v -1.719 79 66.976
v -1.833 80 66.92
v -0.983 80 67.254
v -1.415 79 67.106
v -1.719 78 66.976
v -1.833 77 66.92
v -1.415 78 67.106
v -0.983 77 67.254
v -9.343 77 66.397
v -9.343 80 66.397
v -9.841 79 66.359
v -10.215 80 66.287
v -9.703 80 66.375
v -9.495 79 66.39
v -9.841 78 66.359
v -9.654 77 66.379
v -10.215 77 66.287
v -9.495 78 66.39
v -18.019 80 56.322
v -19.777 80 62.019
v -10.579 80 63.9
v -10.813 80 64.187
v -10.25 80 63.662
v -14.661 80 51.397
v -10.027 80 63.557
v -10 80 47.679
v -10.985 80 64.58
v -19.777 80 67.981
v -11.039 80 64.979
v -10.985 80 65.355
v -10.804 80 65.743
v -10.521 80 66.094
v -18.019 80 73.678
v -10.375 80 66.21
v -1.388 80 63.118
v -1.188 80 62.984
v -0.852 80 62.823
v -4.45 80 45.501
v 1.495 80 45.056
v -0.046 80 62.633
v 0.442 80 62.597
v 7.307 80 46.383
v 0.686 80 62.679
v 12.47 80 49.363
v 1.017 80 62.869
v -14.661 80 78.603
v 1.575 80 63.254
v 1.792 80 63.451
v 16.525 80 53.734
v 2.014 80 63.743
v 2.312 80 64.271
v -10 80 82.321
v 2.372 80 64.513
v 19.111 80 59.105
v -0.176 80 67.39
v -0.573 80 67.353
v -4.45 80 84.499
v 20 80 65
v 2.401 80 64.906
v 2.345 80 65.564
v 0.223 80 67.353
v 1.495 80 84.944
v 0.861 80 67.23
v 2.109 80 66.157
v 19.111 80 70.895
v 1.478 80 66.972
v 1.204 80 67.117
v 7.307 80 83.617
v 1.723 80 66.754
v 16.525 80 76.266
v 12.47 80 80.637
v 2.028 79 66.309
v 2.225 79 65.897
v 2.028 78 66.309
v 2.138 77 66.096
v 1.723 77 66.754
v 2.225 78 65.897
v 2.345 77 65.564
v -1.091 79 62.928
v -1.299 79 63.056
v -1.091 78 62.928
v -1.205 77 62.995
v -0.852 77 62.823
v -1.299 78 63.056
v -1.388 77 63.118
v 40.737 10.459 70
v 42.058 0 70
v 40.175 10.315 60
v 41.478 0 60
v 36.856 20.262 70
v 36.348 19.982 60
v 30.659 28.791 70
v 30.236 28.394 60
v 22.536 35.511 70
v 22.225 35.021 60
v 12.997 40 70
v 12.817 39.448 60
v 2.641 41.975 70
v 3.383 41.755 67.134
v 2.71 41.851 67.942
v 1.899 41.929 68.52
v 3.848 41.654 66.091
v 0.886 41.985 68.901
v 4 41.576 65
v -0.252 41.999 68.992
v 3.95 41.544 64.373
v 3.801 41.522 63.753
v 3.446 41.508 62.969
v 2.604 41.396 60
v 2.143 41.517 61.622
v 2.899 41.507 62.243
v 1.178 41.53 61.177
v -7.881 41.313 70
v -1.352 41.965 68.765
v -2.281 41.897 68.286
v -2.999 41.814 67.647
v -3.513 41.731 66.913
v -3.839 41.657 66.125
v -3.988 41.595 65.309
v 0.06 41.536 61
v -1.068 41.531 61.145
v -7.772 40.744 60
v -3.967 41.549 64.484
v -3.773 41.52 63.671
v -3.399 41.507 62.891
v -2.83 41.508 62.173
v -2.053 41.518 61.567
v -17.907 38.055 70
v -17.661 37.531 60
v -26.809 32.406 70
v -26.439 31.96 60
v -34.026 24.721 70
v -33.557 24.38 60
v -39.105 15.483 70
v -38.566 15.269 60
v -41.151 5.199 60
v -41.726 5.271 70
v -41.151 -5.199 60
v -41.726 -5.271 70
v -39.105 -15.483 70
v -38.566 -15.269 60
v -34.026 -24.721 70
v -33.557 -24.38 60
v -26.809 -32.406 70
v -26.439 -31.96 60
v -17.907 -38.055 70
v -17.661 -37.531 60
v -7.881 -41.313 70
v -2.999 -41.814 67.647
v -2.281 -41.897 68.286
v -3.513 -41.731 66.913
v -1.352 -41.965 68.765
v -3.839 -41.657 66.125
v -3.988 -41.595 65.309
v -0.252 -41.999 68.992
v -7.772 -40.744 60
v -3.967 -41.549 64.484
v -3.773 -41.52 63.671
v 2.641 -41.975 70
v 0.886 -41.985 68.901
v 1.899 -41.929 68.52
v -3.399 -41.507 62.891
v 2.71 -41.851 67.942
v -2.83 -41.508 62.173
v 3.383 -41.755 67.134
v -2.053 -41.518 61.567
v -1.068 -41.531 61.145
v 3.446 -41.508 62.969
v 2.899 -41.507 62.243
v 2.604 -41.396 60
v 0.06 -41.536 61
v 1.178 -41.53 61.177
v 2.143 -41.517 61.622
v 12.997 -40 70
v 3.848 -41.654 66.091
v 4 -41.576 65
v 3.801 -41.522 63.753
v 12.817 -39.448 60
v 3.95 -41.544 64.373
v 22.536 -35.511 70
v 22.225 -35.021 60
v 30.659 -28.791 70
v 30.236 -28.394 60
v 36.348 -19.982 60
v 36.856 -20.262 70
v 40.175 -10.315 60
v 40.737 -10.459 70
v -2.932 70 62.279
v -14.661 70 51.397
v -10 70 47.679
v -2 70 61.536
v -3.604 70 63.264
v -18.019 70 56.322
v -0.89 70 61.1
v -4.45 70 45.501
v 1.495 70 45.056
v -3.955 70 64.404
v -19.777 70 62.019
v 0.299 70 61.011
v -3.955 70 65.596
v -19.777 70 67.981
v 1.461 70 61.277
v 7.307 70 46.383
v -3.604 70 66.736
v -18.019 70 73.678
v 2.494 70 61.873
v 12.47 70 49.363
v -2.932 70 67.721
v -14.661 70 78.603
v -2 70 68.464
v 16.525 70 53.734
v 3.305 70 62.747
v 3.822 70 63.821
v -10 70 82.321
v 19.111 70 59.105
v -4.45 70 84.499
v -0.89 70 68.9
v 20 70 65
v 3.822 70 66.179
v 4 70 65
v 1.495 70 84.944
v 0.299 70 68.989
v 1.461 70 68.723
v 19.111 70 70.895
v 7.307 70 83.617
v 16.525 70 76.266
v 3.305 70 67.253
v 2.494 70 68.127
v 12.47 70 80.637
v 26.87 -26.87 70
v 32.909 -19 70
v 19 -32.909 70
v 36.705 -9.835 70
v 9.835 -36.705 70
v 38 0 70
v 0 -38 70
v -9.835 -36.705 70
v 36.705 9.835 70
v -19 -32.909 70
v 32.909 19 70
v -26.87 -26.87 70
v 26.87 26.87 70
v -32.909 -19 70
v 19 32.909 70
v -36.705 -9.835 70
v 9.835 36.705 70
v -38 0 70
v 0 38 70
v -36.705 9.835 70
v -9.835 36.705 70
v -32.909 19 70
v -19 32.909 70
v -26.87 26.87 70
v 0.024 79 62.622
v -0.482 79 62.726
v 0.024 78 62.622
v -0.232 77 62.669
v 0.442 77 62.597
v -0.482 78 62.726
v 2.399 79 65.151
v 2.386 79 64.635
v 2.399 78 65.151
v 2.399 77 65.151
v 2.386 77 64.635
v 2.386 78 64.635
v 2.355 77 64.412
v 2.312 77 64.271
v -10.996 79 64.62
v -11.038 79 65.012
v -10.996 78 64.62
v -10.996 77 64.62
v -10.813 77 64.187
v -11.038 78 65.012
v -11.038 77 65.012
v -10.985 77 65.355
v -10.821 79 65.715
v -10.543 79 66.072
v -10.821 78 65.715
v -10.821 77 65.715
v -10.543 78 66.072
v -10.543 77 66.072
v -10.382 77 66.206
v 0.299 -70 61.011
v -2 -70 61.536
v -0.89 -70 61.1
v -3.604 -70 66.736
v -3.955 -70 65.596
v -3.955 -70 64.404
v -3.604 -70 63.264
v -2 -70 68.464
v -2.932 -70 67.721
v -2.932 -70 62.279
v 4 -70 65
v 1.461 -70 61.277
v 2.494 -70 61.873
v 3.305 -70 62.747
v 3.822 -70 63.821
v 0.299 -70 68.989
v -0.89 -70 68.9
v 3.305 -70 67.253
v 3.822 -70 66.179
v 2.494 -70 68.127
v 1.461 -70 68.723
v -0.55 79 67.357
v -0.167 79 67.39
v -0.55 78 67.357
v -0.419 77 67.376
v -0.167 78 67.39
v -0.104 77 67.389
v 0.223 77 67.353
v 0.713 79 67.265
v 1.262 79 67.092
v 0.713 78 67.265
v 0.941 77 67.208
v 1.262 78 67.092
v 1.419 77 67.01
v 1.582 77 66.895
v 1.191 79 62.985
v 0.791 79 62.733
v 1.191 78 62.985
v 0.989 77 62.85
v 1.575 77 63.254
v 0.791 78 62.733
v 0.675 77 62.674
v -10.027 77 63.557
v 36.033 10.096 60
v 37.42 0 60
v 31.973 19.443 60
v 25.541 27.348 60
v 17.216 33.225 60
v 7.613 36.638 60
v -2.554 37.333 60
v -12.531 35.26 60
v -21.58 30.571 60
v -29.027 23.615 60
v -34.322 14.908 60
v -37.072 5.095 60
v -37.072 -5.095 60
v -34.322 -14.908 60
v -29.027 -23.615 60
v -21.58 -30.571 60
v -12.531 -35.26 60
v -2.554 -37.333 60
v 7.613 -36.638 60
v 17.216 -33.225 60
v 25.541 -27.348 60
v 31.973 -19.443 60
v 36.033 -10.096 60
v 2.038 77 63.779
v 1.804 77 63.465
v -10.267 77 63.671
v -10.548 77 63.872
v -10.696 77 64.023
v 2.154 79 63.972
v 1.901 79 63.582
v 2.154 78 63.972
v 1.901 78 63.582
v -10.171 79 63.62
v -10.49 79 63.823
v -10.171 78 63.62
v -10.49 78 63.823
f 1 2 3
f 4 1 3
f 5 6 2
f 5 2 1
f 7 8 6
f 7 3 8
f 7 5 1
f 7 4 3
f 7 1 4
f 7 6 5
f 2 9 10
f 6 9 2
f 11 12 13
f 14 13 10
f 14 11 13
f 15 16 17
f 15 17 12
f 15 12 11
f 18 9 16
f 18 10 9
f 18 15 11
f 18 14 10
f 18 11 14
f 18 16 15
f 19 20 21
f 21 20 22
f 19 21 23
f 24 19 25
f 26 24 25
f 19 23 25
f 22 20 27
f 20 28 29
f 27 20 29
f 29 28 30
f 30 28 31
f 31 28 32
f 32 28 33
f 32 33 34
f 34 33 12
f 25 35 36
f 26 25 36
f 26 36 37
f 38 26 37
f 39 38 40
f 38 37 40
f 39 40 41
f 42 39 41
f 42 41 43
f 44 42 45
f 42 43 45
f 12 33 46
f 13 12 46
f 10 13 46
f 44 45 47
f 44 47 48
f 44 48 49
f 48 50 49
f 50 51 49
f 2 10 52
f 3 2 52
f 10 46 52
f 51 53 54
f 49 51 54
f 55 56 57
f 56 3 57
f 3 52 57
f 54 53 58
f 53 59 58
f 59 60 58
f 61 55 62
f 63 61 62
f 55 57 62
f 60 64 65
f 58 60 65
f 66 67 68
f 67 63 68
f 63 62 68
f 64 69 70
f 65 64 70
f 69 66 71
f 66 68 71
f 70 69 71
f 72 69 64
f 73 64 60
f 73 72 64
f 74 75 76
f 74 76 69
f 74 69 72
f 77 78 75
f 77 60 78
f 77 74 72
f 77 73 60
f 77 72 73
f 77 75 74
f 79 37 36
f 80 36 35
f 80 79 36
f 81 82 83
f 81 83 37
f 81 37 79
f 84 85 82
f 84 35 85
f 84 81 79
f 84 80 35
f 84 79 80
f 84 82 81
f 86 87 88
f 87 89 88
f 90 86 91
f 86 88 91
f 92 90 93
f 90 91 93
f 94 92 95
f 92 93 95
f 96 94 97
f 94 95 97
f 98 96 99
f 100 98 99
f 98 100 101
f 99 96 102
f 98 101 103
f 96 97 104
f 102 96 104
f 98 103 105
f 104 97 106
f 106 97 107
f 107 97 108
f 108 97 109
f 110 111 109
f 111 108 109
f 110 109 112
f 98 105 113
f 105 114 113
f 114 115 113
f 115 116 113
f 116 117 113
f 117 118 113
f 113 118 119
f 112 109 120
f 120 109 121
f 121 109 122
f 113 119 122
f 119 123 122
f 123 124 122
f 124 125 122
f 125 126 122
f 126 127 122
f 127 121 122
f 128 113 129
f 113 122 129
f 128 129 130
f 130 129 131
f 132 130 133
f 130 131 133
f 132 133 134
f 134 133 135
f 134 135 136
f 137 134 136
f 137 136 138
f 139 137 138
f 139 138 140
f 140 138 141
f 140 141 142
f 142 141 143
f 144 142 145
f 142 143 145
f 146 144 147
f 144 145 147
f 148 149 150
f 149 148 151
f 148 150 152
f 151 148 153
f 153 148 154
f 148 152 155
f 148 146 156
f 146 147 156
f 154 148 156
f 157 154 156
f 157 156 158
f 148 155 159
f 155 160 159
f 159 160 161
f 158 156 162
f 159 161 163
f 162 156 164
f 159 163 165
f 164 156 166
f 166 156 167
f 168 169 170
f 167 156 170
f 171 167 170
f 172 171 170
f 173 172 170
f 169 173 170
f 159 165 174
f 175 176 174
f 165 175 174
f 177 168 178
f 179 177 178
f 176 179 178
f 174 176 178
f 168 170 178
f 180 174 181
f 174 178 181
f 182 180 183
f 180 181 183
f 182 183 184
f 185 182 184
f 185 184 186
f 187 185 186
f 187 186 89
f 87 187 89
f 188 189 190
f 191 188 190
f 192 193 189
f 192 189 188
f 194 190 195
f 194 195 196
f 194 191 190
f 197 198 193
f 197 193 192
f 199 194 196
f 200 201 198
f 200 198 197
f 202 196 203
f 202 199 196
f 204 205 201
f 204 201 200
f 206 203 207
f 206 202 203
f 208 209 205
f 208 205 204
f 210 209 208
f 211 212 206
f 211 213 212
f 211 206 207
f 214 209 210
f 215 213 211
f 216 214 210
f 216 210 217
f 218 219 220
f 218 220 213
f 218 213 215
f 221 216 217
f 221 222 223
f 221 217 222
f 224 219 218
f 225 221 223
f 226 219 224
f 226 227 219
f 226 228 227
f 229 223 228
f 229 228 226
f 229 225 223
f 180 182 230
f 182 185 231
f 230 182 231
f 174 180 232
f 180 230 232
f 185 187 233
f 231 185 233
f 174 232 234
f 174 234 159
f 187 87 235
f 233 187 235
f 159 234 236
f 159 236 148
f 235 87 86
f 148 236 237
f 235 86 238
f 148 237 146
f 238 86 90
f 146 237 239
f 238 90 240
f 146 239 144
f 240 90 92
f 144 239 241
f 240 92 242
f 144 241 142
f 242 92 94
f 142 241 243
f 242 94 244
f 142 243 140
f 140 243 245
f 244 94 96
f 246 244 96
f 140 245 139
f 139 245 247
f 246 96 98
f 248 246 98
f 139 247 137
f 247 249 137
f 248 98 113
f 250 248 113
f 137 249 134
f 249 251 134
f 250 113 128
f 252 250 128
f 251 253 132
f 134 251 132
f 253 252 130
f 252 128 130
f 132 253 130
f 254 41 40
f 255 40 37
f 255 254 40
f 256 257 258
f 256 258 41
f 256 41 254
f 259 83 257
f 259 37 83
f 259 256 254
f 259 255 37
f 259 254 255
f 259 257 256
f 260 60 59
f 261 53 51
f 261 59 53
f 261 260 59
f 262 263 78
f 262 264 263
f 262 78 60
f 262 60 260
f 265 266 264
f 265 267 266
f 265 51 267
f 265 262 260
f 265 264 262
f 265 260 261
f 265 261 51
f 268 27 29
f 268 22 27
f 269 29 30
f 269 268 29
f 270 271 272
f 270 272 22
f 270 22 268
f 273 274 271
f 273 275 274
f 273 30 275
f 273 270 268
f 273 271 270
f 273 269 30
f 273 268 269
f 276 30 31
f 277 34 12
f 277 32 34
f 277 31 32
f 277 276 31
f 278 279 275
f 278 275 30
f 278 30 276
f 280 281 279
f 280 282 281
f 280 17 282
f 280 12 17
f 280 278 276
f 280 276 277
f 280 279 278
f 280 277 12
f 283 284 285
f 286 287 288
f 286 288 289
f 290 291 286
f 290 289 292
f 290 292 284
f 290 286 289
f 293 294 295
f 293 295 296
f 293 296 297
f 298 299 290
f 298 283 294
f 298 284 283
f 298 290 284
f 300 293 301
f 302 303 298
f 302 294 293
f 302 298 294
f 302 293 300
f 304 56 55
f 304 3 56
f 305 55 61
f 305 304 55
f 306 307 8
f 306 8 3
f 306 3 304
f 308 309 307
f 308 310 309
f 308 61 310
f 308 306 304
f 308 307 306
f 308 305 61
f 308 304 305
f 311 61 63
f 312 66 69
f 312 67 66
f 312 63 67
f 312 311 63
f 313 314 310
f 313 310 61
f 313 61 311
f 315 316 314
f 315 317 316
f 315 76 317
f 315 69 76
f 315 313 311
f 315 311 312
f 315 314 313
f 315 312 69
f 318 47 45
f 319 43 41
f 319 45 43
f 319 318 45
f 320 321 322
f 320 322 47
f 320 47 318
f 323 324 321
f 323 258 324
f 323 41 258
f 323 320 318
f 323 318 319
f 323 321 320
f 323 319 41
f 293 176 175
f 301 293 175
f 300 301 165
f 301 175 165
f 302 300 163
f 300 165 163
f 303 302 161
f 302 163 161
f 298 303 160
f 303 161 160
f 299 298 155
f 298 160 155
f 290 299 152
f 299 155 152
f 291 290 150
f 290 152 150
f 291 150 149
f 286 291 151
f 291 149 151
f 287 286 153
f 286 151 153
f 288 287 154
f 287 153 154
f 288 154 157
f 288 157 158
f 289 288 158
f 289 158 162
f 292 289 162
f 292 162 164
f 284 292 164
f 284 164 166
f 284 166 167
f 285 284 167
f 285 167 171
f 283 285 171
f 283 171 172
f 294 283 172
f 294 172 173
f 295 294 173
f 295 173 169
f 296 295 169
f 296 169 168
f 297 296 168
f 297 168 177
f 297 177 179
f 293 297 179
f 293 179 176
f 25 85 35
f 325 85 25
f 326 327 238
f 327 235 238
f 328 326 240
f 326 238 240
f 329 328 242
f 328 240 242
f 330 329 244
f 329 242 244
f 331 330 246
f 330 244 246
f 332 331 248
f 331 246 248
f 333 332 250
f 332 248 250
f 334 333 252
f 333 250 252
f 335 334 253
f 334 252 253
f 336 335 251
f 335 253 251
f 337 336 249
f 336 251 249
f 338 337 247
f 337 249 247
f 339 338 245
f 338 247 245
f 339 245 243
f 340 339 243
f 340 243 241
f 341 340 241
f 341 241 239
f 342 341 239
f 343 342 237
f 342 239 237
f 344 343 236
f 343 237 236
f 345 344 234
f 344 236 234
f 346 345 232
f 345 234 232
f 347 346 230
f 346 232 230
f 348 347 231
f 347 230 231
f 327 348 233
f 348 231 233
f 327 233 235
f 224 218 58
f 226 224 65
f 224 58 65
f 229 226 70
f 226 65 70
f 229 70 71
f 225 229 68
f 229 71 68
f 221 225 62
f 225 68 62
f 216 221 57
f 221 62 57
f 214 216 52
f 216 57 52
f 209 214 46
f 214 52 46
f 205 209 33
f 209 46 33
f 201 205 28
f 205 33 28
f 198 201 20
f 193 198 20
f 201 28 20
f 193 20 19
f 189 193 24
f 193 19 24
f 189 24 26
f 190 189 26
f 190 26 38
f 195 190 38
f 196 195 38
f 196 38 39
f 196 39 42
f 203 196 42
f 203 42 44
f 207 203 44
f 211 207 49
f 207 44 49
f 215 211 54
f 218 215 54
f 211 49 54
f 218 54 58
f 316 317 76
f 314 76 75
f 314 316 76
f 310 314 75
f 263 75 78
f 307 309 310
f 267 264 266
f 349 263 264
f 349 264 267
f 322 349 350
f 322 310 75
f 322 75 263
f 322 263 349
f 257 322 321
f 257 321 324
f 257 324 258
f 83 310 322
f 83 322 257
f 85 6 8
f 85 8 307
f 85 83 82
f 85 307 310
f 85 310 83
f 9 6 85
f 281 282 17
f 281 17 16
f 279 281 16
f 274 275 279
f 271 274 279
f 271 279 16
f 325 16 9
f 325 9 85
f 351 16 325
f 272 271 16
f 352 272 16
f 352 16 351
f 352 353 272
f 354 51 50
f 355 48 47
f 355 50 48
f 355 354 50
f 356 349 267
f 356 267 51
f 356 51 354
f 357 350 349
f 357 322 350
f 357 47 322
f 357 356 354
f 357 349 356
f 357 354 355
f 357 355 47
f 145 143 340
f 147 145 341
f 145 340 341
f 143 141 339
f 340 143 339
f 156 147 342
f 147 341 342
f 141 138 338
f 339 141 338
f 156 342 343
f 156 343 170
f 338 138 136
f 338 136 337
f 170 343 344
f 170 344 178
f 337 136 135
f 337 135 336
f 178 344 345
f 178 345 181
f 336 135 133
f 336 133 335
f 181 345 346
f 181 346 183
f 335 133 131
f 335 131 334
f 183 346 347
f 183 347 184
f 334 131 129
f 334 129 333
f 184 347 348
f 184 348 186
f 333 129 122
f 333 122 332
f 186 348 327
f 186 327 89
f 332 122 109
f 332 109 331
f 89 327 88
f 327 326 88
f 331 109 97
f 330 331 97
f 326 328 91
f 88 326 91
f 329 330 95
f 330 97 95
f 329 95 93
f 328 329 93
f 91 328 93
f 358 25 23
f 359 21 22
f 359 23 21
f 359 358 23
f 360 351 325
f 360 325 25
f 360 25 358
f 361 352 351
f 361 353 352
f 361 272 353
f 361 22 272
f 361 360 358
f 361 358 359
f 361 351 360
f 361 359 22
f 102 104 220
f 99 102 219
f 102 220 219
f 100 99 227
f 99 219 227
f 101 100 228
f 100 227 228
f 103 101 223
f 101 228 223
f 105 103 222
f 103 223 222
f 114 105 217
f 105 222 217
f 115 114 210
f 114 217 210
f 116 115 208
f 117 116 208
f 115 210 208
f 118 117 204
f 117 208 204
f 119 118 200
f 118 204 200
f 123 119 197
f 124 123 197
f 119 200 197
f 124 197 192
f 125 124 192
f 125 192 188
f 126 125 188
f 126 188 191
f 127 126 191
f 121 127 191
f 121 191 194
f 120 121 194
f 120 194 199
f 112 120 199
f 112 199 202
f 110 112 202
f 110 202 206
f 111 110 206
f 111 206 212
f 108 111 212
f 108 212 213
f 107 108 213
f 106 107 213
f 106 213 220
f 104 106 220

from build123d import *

# Parameters (mm, degrees)
EXTRUDE_DEPTH           = 10
EXTRUDE_PLACEMENT_ANGLE = 90
CYLINDER004_R           = 38
CYLINDER004_DEPTH       = 30
CYLINDER003_R           = 4
CYLINDER003_DEPTH       = 140
CYLINDER005_R           = 20
CYLINDER005_DEPTH       = 10
CYLINDER_R              = 46
CYLINDER_DEPTH          = 60


with BuildPart() as extrude_body:
    # path2399 → Extrude (new body)
    with BuildSketch(Plane(origin=(8.682374, 337.01873, 81), x_dir=(0, 1, 0), z_dir=(0, 0, 1))):
        with BuildLine():
            add(Edge.make_bspline(
                [(-1.415579, 5.024931), (-1.938341, -2.484397)],
                knots=[0, 0, 7.527502, 7.527502], degree=1))
            add(Edge.make_bspline(
                [(-1.938341, -2.484397), (-1.938341, -2.484397), (-2.134903, -2.858259), (-2.273136, -3.334737)],
                knots=[0, 0, 0, 0, 1, 1, 1, 1], degree=3))
            add(Edge.make_bspline(
                [(-2.273136, -3.334737), (-2.411369, -3.811216), (-2.443203, -4.128926), (-2.371685, -4.540758)],
                knots=[0, 0, 0, 0, 1, 1, 1, 1], degree=3))
            add(Edge.make_bspline(
                [(-2.371685, -4.540758), (-2.300167, -4.952591), (-2.218933, -5.672599), (-1.772797, -6.040394)],
                knots=[0, 0, 0, 0, 1, 1, 1, 1], degree=3))
            add(Edge.make_bspline(
                [(-1.772797, -6.040394), (-1.326661, -6.40819), (-0.861351, -6.572675), (-0.583202, -6.662312)],
                knots=[0, 0, 0, 0, 1, 1, 1, 1], degree=3))
            add(Edge.make_bspline(
                [(-0.583202, -6.662312), (-0.305053, -6.751952), (0.507781, -6.731952), (0.709843, -6.630052)],
                knots=[0, 0, 0, 0, 1, 1, 1, 1], degree=3))
            add(Edge.make_bspline(
                [(0.709843, -6.630052), (0.911905, -6.52815), (1.481843, -6.245909), (1.726833, -5.892641)],
                knots=[0, 0, 0, 0, 1, 1, 1, 1], degree=3))
            add(Edge.make_bspline(
                [(1.726833, -5.892641), (1.971823, -5.539373), (2.340182, -5.059724), (2.384256, -4.759981)],
                knots=[0, 0, 0, 0, 1, 1, 1, 1], degree=3))
            add(Edge.make_bspline(
                [(2.384256, -4.759981), (2.42833, -4.460237), (2.223091, -3.691858), (2.158411, -3.465999)],
                knots=[0, 0, 0, 0, 1, 1, 1, 1], degree=3))
            add(Edge.make_bspline(
                [(2.158411, -3.465999), (2.093732, -3.240141), (1.863634, -2.929328), (1.863634, -2.929328)],
                knots=[0, 0, 0, 0, 1, 1, 1, 1], degree=3))
            add(Edge.make_bspline(
                [(1.863634, -2.929328), (1.423808, 5.709855)],
                knots=[0, 0, 8.650371, 8.650371], degree=1))
            add(Edge.make_bspline(
                [(1.423808, 5.709855), (1.423808, 5.709855), (1.246198, 6.226563), (0.794563, 6.495307)],
                knots=[0, 0, 0, 0, 1, 1, 1, 1], degree=3))
            add(Edge.make_bspline(
                [(0.794563, 6.495307), (0.342929, 6.764051), (-0.057622, 6.753041), (-0.37358, 6.666974)],
                knots=[0, 0, 0, 0, 1, 1, 1, 1], degree=3))
            add(Edge.make_bspline(
                [(-0.37358, 6.666974), (-0.689538, 6.580907), (-1.208145, 6.230265), (-1.306201, 5.897514)],
                knots=[0, 0, 0, 0, 1, 1, 1, 1], degree=3))
            add(Edge.make_bspline(
                [(-1.306201, 5.897514), (-1.404257, 5.564763), (-1.415579, 5.024931), (-1.415579, 5.024931)],
                knots=[0, 0, 0, 0, 1, 1, 1, 1], degree=3))
        make_face()
    extrude(amount=EXTRUDE_DEPTH)


with BuildPart() as extrude_body_1:
    # Extrude placement: moved
    add(extrude_body.part.moved(Location((-13, -4, 402))).rotate(Axis((-13, -4, 402), (-1, 0, 0)), EXTRUDE_PLACEMENT_ANGLE))


with BuildPart() as cylinder004:
    # Cylinder004 → Cylinder004 (new body)
    with BuildSketch(Plane.XY.offset(56)):
        Circle(CYLINDER004_R)
    extrude(amount=CYLINDER004_DEPTH)


with BuildPart() as cut:
    # Cylinder003 → Cylinder003 (new body)
    with BuildSketch(Plane(origin=(0, 70, 65), x_dir=(1, 0, 0), z_dir=(0, -1, 0))):
        Circle(CYLINDER003_R)
    extrude(amount=CYLINDER003_DEPTH)

    # Cut: cut Cylinder004
    add(cylinder004.part, mode=Mode.SUBTRACT)


with BuildPart() as cut001:
    # Cylinder005 → Cylinder005 (new body)
    with BuildSketch(Plane(origin=(0, 80, 65), x_dir=(1, 0, 0), z_dir=(0, -1, 0))):
        Circle(CYLINDER005_R)
    extrude(amount=CYLINDER005_DEPTH)

    # Fusion: union Cut
    add(cut.part)

    # Cut001: cut Extrude body
    add(extrude_body_1.part, mode=Mode.SUBTRACT)


with BuildPart() as cylinder:
    # Cylinder → Cylinder (new body)
    with BuildSketch(Plane.XY):
        Circle(CYLINDER_R)
    extrude(amount=CYLINDER_DEPTH)


with BuildPart() as fusion001:
    # Sketch → Revolve (revolve)
    with BuildSketch(Plane.XZ):
        Polygon((0, 1), (34, 1), (38, 70), (42.057971, 70), (38, 0), (0, 0), align=None)
    revolve(axis=Axis((0, 0, 0), (0, 0, 1)))

    # Cut002: cut Cylinder
    add(cylinder.part, mode=Mode.SUBTRACT)

    # Fusion001: union Cut001
    add(cut001.part)


solid = fusion001.part
